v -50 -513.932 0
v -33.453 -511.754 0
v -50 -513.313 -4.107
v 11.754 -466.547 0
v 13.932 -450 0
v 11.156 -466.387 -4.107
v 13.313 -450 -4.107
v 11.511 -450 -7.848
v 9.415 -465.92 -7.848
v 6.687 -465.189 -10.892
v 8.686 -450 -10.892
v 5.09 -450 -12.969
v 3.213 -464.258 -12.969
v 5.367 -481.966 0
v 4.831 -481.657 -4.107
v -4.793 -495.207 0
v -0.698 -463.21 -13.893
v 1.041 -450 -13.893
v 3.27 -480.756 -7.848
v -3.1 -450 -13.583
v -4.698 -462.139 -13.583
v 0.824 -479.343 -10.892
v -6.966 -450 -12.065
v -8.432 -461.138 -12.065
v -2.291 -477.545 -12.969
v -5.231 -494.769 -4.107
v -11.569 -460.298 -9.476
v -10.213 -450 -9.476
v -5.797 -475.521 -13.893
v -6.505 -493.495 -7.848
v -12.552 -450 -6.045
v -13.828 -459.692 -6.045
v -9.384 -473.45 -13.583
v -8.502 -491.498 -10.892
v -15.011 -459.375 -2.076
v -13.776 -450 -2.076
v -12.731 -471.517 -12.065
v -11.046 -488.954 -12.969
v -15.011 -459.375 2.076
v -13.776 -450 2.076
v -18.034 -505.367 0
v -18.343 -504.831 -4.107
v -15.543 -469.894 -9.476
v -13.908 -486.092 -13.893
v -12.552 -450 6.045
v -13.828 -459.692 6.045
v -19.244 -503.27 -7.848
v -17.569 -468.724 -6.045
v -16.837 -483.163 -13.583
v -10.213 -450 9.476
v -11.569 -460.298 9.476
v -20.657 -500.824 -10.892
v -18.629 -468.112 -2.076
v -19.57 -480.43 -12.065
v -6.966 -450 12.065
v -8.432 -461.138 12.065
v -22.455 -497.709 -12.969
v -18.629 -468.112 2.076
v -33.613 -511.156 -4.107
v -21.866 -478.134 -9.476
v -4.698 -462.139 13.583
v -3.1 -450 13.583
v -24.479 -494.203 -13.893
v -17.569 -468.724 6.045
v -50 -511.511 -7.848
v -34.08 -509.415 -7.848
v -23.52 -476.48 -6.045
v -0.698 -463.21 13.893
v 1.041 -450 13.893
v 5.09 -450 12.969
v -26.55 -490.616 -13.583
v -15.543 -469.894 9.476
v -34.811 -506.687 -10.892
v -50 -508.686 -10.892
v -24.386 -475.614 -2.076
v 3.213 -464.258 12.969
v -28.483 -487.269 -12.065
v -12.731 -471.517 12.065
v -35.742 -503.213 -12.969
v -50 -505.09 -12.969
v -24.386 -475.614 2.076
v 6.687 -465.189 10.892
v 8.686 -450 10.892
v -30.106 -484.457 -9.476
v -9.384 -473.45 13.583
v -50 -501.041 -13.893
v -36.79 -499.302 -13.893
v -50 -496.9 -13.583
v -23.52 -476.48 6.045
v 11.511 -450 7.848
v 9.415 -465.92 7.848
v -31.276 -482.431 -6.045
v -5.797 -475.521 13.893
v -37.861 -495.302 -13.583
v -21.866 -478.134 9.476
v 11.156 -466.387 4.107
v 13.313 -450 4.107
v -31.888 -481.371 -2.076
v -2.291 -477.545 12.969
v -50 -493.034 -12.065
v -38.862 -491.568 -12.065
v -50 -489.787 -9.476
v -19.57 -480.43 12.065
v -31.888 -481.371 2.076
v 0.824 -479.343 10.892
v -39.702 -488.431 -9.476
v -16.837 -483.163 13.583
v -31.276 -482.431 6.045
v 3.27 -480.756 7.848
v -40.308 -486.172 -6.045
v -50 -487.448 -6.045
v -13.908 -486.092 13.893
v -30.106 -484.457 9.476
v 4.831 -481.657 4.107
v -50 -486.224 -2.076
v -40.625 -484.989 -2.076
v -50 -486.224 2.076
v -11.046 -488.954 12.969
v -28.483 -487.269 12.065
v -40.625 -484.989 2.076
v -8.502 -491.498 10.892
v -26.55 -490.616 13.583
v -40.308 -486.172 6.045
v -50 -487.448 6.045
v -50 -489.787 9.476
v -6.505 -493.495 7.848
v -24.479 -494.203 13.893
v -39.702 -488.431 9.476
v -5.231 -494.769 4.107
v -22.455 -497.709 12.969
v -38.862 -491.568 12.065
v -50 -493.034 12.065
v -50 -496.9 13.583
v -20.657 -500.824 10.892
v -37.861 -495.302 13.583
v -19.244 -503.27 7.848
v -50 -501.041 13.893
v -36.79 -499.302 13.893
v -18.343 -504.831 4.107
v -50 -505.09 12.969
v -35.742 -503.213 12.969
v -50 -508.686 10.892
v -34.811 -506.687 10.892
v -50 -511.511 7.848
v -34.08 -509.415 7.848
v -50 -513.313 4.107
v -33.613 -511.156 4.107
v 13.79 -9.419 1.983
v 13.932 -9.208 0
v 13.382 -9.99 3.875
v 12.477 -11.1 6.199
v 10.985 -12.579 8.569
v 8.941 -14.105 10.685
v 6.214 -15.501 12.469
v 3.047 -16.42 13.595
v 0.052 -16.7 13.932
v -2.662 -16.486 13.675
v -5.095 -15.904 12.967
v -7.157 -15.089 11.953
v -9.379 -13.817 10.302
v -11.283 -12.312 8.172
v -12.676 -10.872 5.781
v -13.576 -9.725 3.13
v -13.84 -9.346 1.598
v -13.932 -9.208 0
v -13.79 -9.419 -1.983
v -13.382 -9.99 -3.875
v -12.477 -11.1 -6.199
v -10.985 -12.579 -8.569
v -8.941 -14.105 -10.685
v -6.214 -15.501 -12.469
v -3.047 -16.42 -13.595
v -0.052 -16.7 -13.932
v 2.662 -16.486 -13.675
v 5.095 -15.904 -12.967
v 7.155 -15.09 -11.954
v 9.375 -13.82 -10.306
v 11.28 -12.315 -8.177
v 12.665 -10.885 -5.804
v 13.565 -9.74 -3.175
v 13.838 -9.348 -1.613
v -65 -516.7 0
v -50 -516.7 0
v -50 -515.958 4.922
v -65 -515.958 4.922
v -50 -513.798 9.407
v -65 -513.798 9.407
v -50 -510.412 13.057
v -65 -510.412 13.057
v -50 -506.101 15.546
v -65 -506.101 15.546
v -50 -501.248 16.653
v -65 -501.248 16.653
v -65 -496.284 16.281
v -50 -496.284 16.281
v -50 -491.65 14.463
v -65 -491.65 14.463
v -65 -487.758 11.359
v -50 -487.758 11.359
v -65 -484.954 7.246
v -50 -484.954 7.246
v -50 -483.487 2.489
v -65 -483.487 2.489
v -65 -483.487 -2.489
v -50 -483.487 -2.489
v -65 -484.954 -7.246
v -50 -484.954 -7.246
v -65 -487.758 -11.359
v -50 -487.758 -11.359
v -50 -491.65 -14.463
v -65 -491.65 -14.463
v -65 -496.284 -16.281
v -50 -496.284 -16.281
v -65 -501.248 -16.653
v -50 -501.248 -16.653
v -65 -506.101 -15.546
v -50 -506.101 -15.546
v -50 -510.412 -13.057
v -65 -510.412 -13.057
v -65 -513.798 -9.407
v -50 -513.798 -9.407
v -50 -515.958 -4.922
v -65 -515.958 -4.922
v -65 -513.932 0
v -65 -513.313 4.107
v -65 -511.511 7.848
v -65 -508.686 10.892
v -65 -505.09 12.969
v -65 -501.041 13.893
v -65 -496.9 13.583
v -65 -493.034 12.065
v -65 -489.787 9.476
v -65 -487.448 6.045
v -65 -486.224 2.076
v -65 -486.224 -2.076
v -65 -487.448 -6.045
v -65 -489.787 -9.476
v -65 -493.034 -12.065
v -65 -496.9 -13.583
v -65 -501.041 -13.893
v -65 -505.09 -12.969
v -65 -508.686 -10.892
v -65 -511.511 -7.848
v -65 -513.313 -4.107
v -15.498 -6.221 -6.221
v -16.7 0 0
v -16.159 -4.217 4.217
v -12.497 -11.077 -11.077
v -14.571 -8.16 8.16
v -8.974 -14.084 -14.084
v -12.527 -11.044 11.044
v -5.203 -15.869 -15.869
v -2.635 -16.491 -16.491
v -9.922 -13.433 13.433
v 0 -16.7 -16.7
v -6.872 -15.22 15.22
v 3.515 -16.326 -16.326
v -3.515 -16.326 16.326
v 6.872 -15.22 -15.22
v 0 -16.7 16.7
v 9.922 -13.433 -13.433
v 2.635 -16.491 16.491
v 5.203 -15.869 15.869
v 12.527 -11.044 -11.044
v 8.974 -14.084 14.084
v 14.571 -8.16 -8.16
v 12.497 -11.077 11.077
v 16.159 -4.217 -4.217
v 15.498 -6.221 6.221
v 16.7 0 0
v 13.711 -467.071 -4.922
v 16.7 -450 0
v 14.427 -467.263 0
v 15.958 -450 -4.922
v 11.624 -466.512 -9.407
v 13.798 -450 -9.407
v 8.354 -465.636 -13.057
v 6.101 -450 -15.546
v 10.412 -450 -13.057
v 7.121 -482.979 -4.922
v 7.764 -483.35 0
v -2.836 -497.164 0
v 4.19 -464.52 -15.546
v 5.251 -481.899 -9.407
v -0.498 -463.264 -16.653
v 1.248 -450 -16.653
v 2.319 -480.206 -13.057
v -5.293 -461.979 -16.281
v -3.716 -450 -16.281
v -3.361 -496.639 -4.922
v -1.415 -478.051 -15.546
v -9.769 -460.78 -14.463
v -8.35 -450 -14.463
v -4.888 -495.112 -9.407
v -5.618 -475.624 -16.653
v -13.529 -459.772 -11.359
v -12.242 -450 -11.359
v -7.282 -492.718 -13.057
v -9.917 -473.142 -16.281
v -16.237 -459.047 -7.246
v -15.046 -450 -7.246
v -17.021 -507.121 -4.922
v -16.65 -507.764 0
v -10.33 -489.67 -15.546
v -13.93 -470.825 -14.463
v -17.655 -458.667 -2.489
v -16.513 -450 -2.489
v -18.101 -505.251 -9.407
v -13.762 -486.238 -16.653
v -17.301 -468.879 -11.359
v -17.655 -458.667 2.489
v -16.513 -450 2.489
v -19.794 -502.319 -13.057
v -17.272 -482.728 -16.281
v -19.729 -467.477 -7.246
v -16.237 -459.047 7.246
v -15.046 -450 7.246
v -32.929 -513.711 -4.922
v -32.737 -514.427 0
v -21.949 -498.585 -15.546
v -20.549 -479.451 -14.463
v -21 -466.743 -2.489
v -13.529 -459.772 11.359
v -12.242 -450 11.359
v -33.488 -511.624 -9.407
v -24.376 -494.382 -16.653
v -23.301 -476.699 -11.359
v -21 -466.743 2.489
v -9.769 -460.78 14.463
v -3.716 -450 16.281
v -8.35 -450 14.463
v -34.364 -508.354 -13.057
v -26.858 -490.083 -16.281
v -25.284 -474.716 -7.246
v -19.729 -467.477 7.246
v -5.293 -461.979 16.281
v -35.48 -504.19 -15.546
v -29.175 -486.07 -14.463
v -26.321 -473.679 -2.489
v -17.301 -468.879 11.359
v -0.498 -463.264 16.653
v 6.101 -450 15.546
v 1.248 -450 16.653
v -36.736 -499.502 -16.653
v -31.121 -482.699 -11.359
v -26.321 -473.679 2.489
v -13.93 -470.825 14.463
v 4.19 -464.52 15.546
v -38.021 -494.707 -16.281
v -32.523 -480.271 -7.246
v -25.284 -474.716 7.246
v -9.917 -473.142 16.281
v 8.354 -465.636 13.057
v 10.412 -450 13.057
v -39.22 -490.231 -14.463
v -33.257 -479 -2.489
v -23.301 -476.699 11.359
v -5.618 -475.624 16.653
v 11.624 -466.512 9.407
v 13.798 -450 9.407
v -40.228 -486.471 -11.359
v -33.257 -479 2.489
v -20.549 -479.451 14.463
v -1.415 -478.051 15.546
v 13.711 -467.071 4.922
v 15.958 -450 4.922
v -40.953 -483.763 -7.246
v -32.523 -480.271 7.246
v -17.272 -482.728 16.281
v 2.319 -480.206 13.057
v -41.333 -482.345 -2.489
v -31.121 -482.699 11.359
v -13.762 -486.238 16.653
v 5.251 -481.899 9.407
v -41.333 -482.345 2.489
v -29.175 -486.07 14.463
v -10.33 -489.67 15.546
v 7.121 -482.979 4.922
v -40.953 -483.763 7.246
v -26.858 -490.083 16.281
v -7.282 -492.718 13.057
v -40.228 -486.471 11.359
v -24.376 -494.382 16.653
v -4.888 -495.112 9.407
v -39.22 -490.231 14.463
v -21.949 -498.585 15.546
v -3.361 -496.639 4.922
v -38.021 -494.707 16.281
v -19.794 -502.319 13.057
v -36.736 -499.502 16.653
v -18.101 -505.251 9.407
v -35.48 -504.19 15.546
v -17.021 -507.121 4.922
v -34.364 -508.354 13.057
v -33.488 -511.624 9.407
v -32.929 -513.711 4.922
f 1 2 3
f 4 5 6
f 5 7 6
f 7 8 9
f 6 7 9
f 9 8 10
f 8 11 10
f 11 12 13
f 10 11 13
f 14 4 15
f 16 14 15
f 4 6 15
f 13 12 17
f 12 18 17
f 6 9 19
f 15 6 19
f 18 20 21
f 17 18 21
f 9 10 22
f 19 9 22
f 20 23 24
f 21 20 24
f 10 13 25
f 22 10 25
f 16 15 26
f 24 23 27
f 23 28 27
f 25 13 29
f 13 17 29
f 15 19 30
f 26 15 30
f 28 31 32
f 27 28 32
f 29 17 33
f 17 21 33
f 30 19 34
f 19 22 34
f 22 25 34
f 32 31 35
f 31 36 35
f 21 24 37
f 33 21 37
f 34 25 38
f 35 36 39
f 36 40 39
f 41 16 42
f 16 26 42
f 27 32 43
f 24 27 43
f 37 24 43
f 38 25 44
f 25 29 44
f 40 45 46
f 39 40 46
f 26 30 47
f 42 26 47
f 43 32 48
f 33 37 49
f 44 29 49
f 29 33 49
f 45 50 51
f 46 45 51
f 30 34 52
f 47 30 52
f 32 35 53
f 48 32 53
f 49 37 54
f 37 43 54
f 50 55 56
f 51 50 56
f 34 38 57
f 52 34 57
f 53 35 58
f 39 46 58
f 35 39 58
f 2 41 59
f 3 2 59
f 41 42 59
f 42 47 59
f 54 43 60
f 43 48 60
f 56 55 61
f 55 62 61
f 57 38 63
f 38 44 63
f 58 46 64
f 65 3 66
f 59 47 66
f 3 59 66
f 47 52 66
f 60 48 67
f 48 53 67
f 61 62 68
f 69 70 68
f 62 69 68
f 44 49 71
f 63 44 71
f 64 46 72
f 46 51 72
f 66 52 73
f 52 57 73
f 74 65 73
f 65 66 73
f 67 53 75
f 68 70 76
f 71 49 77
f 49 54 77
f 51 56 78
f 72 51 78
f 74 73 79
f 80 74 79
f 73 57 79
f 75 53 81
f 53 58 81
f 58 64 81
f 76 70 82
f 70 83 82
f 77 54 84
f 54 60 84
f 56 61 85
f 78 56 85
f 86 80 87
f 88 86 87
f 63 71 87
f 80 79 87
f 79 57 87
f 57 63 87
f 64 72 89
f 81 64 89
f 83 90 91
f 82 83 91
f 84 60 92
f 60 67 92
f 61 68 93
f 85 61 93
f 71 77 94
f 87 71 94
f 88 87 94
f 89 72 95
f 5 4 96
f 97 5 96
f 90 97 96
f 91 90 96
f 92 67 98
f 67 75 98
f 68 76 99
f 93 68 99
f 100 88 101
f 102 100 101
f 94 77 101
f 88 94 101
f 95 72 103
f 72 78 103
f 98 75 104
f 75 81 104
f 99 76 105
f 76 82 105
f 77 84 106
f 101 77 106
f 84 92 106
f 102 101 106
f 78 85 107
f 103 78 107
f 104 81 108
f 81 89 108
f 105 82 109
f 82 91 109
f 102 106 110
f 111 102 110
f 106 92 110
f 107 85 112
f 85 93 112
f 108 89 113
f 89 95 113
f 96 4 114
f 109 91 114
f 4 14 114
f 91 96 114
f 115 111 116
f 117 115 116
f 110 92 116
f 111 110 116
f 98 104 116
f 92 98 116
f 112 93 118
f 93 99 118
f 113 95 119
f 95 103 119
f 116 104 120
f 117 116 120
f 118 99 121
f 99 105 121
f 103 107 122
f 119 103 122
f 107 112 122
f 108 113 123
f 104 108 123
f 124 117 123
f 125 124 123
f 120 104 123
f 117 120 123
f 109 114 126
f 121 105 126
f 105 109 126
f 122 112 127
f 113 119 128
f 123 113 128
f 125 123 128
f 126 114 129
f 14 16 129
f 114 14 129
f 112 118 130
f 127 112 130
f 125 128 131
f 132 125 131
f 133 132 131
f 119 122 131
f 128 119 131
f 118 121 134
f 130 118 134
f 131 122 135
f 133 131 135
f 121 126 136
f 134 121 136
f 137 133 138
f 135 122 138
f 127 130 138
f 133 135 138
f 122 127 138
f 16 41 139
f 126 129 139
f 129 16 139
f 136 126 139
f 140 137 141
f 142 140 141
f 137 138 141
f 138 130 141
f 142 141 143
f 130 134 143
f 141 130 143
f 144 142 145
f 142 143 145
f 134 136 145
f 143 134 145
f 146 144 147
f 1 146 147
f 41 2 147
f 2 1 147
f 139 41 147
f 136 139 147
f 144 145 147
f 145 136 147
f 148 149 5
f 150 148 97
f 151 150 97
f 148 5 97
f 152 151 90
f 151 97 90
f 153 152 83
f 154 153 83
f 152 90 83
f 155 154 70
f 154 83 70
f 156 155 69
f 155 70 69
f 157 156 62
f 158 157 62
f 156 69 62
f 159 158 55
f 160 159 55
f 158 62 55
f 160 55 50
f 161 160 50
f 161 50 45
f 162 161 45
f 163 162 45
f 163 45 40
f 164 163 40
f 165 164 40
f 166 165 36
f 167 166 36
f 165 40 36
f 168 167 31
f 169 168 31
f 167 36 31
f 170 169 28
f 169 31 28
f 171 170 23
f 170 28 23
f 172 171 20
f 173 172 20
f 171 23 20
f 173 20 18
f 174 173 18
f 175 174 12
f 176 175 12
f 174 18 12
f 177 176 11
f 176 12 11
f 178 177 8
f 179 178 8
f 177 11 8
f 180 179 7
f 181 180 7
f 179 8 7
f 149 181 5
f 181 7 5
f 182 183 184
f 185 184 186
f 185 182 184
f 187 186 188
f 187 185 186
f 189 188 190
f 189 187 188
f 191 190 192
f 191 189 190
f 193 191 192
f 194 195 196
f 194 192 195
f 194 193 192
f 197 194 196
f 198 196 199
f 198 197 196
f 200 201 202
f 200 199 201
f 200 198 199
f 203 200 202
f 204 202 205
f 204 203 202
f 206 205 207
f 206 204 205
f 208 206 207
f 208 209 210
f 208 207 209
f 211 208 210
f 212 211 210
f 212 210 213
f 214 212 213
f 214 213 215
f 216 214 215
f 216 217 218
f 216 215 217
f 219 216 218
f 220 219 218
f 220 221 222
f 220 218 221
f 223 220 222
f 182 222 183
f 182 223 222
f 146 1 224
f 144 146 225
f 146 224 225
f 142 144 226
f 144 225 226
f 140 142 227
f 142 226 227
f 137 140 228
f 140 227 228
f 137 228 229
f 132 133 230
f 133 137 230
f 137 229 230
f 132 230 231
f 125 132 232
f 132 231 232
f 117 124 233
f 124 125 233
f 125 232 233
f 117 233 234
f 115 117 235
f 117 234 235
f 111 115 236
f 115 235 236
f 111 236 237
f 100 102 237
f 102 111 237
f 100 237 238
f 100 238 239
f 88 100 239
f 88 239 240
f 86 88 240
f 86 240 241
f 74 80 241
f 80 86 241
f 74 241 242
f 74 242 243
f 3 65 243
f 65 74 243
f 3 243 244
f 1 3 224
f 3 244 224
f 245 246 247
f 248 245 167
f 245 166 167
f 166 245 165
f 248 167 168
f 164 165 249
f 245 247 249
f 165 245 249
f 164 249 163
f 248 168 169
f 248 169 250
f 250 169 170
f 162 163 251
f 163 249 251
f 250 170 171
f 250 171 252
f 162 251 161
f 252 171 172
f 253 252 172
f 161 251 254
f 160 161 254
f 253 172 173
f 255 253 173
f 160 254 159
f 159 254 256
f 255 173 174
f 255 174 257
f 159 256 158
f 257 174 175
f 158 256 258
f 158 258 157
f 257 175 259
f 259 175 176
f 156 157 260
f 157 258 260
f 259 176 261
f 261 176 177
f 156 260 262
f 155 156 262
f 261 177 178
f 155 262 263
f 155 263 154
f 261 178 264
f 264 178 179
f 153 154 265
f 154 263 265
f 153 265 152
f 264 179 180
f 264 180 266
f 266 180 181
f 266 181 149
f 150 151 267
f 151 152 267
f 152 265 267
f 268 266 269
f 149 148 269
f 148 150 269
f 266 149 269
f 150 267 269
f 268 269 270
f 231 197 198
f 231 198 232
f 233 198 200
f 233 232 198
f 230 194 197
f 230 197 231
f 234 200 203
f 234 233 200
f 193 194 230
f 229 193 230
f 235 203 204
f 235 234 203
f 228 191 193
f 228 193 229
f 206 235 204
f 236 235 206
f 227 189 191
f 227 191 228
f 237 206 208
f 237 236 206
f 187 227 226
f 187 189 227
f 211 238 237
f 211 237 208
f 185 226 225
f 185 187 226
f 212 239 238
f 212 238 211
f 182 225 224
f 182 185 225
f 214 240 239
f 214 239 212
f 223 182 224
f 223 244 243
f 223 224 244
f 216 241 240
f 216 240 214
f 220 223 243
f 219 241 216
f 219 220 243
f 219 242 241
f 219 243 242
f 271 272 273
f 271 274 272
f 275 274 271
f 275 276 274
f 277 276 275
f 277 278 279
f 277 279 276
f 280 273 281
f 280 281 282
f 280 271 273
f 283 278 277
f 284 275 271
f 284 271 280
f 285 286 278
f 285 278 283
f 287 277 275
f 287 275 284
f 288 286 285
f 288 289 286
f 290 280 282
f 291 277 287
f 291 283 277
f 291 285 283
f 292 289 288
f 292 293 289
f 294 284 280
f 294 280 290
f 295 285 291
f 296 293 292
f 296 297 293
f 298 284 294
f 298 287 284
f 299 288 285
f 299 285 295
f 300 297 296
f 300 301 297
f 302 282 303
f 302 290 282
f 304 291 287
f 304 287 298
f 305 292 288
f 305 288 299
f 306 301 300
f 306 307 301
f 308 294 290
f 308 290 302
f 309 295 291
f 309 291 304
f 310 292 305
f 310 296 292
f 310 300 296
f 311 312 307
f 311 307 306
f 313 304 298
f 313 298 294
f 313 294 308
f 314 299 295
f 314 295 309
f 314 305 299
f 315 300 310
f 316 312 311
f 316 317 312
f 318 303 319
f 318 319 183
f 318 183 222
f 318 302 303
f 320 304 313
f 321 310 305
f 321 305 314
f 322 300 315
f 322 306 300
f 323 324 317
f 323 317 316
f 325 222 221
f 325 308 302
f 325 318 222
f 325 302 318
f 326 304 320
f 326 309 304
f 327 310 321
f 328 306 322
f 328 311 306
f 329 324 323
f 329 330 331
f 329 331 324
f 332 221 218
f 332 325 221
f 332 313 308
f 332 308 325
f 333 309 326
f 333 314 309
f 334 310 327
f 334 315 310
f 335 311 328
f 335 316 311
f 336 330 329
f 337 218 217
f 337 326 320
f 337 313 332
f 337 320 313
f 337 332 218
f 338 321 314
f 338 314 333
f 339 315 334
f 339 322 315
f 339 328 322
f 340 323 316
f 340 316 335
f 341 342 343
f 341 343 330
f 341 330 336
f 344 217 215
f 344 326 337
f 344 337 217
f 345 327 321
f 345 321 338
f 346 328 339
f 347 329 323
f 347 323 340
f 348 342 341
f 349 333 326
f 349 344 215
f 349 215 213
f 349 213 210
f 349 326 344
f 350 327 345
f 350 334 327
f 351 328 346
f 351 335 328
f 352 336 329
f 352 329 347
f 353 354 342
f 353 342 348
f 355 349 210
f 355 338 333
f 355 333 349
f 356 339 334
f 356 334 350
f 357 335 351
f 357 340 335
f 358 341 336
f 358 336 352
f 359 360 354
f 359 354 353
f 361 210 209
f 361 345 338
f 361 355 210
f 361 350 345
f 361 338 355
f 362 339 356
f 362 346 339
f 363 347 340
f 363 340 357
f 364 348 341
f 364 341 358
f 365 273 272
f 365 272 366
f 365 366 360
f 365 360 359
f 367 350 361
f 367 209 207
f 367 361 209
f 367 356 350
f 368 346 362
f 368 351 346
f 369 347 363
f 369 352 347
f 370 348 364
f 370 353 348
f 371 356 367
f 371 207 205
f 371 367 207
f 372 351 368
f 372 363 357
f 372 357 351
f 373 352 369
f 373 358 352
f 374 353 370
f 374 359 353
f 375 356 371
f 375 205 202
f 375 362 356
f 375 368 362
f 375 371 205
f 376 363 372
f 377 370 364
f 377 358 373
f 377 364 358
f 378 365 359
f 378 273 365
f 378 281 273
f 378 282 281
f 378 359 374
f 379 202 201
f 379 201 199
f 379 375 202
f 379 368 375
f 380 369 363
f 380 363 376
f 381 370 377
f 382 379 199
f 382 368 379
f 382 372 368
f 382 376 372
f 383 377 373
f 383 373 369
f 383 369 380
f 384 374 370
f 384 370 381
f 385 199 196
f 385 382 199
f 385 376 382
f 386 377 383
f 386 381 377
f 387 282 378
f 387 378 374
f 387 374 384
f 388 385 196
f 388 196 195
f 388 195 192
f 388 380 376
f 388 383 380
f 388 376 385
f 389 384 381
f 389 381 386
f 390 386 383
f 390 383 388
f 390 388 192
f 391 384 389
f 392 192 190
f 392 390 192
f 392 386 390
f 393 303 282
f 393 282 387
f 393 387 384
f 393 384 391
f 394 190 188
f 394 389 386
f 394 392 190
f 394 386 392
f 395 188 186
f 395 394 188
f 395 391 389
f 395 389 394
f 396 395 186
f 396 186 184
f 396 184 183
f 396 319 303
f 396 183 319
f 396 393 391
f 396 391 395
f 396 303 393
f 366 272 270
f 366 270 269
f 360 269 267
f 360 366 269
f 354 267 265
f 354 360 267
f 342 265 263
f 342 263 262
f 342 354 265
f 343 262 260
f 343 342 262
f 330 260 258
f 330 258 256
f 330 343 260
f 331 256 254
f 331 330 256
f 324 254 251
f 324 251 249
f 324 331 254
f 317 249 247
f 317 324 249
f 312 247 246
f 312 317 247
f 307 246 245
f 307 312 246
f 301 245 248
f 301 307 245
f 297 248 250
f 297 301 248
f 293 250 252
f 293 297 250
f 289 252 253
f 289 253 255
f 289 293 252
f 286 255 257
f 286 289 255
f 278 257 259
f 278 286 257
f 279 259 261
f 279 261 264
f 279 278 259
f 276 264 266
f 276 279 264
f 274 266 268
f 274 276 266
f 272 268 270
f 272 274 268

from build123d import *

# Parameters (mm, degrees)
F1_R          = 16.7
F1_R_2        = 13.932
F3_R          = 16.7
F4_DEPTH      = 25
F4_DEPTH_BACK = 25


with BuildPart() as f2:
    # F2: sweep along a path in F0
    with BuildLine(Plane.XY) as f2_path:
        Line((0, 0), (0, -450))
        ThreePointArc((0, -450), (-14.6446609407, -485.3553390593), (-50, -500))
        Line((-50, -500), (-65, -500))
    # F1 (on Front) → F2 (sweep)
    with BuildSketch(Plane.XZ):
        Circle(F1_R)
        Circle(F1_R_2, mode=Mode.SUBTRACT)
    sweep(path=f2_path.line)

    # F3 (on Top) → F4 (cut, two sides)
    with BuildSketch(Plane.XY) as f4_sk:
        Circle(F3_R)
    extrude(amount=-F4_DEPTH, mode=Mode.SUBTRACT)
    extrude(f4_sk.sketch, amount=F4_DEPTH_BACK, mode=Mode.SUBTRACT)


solid = f2.part
